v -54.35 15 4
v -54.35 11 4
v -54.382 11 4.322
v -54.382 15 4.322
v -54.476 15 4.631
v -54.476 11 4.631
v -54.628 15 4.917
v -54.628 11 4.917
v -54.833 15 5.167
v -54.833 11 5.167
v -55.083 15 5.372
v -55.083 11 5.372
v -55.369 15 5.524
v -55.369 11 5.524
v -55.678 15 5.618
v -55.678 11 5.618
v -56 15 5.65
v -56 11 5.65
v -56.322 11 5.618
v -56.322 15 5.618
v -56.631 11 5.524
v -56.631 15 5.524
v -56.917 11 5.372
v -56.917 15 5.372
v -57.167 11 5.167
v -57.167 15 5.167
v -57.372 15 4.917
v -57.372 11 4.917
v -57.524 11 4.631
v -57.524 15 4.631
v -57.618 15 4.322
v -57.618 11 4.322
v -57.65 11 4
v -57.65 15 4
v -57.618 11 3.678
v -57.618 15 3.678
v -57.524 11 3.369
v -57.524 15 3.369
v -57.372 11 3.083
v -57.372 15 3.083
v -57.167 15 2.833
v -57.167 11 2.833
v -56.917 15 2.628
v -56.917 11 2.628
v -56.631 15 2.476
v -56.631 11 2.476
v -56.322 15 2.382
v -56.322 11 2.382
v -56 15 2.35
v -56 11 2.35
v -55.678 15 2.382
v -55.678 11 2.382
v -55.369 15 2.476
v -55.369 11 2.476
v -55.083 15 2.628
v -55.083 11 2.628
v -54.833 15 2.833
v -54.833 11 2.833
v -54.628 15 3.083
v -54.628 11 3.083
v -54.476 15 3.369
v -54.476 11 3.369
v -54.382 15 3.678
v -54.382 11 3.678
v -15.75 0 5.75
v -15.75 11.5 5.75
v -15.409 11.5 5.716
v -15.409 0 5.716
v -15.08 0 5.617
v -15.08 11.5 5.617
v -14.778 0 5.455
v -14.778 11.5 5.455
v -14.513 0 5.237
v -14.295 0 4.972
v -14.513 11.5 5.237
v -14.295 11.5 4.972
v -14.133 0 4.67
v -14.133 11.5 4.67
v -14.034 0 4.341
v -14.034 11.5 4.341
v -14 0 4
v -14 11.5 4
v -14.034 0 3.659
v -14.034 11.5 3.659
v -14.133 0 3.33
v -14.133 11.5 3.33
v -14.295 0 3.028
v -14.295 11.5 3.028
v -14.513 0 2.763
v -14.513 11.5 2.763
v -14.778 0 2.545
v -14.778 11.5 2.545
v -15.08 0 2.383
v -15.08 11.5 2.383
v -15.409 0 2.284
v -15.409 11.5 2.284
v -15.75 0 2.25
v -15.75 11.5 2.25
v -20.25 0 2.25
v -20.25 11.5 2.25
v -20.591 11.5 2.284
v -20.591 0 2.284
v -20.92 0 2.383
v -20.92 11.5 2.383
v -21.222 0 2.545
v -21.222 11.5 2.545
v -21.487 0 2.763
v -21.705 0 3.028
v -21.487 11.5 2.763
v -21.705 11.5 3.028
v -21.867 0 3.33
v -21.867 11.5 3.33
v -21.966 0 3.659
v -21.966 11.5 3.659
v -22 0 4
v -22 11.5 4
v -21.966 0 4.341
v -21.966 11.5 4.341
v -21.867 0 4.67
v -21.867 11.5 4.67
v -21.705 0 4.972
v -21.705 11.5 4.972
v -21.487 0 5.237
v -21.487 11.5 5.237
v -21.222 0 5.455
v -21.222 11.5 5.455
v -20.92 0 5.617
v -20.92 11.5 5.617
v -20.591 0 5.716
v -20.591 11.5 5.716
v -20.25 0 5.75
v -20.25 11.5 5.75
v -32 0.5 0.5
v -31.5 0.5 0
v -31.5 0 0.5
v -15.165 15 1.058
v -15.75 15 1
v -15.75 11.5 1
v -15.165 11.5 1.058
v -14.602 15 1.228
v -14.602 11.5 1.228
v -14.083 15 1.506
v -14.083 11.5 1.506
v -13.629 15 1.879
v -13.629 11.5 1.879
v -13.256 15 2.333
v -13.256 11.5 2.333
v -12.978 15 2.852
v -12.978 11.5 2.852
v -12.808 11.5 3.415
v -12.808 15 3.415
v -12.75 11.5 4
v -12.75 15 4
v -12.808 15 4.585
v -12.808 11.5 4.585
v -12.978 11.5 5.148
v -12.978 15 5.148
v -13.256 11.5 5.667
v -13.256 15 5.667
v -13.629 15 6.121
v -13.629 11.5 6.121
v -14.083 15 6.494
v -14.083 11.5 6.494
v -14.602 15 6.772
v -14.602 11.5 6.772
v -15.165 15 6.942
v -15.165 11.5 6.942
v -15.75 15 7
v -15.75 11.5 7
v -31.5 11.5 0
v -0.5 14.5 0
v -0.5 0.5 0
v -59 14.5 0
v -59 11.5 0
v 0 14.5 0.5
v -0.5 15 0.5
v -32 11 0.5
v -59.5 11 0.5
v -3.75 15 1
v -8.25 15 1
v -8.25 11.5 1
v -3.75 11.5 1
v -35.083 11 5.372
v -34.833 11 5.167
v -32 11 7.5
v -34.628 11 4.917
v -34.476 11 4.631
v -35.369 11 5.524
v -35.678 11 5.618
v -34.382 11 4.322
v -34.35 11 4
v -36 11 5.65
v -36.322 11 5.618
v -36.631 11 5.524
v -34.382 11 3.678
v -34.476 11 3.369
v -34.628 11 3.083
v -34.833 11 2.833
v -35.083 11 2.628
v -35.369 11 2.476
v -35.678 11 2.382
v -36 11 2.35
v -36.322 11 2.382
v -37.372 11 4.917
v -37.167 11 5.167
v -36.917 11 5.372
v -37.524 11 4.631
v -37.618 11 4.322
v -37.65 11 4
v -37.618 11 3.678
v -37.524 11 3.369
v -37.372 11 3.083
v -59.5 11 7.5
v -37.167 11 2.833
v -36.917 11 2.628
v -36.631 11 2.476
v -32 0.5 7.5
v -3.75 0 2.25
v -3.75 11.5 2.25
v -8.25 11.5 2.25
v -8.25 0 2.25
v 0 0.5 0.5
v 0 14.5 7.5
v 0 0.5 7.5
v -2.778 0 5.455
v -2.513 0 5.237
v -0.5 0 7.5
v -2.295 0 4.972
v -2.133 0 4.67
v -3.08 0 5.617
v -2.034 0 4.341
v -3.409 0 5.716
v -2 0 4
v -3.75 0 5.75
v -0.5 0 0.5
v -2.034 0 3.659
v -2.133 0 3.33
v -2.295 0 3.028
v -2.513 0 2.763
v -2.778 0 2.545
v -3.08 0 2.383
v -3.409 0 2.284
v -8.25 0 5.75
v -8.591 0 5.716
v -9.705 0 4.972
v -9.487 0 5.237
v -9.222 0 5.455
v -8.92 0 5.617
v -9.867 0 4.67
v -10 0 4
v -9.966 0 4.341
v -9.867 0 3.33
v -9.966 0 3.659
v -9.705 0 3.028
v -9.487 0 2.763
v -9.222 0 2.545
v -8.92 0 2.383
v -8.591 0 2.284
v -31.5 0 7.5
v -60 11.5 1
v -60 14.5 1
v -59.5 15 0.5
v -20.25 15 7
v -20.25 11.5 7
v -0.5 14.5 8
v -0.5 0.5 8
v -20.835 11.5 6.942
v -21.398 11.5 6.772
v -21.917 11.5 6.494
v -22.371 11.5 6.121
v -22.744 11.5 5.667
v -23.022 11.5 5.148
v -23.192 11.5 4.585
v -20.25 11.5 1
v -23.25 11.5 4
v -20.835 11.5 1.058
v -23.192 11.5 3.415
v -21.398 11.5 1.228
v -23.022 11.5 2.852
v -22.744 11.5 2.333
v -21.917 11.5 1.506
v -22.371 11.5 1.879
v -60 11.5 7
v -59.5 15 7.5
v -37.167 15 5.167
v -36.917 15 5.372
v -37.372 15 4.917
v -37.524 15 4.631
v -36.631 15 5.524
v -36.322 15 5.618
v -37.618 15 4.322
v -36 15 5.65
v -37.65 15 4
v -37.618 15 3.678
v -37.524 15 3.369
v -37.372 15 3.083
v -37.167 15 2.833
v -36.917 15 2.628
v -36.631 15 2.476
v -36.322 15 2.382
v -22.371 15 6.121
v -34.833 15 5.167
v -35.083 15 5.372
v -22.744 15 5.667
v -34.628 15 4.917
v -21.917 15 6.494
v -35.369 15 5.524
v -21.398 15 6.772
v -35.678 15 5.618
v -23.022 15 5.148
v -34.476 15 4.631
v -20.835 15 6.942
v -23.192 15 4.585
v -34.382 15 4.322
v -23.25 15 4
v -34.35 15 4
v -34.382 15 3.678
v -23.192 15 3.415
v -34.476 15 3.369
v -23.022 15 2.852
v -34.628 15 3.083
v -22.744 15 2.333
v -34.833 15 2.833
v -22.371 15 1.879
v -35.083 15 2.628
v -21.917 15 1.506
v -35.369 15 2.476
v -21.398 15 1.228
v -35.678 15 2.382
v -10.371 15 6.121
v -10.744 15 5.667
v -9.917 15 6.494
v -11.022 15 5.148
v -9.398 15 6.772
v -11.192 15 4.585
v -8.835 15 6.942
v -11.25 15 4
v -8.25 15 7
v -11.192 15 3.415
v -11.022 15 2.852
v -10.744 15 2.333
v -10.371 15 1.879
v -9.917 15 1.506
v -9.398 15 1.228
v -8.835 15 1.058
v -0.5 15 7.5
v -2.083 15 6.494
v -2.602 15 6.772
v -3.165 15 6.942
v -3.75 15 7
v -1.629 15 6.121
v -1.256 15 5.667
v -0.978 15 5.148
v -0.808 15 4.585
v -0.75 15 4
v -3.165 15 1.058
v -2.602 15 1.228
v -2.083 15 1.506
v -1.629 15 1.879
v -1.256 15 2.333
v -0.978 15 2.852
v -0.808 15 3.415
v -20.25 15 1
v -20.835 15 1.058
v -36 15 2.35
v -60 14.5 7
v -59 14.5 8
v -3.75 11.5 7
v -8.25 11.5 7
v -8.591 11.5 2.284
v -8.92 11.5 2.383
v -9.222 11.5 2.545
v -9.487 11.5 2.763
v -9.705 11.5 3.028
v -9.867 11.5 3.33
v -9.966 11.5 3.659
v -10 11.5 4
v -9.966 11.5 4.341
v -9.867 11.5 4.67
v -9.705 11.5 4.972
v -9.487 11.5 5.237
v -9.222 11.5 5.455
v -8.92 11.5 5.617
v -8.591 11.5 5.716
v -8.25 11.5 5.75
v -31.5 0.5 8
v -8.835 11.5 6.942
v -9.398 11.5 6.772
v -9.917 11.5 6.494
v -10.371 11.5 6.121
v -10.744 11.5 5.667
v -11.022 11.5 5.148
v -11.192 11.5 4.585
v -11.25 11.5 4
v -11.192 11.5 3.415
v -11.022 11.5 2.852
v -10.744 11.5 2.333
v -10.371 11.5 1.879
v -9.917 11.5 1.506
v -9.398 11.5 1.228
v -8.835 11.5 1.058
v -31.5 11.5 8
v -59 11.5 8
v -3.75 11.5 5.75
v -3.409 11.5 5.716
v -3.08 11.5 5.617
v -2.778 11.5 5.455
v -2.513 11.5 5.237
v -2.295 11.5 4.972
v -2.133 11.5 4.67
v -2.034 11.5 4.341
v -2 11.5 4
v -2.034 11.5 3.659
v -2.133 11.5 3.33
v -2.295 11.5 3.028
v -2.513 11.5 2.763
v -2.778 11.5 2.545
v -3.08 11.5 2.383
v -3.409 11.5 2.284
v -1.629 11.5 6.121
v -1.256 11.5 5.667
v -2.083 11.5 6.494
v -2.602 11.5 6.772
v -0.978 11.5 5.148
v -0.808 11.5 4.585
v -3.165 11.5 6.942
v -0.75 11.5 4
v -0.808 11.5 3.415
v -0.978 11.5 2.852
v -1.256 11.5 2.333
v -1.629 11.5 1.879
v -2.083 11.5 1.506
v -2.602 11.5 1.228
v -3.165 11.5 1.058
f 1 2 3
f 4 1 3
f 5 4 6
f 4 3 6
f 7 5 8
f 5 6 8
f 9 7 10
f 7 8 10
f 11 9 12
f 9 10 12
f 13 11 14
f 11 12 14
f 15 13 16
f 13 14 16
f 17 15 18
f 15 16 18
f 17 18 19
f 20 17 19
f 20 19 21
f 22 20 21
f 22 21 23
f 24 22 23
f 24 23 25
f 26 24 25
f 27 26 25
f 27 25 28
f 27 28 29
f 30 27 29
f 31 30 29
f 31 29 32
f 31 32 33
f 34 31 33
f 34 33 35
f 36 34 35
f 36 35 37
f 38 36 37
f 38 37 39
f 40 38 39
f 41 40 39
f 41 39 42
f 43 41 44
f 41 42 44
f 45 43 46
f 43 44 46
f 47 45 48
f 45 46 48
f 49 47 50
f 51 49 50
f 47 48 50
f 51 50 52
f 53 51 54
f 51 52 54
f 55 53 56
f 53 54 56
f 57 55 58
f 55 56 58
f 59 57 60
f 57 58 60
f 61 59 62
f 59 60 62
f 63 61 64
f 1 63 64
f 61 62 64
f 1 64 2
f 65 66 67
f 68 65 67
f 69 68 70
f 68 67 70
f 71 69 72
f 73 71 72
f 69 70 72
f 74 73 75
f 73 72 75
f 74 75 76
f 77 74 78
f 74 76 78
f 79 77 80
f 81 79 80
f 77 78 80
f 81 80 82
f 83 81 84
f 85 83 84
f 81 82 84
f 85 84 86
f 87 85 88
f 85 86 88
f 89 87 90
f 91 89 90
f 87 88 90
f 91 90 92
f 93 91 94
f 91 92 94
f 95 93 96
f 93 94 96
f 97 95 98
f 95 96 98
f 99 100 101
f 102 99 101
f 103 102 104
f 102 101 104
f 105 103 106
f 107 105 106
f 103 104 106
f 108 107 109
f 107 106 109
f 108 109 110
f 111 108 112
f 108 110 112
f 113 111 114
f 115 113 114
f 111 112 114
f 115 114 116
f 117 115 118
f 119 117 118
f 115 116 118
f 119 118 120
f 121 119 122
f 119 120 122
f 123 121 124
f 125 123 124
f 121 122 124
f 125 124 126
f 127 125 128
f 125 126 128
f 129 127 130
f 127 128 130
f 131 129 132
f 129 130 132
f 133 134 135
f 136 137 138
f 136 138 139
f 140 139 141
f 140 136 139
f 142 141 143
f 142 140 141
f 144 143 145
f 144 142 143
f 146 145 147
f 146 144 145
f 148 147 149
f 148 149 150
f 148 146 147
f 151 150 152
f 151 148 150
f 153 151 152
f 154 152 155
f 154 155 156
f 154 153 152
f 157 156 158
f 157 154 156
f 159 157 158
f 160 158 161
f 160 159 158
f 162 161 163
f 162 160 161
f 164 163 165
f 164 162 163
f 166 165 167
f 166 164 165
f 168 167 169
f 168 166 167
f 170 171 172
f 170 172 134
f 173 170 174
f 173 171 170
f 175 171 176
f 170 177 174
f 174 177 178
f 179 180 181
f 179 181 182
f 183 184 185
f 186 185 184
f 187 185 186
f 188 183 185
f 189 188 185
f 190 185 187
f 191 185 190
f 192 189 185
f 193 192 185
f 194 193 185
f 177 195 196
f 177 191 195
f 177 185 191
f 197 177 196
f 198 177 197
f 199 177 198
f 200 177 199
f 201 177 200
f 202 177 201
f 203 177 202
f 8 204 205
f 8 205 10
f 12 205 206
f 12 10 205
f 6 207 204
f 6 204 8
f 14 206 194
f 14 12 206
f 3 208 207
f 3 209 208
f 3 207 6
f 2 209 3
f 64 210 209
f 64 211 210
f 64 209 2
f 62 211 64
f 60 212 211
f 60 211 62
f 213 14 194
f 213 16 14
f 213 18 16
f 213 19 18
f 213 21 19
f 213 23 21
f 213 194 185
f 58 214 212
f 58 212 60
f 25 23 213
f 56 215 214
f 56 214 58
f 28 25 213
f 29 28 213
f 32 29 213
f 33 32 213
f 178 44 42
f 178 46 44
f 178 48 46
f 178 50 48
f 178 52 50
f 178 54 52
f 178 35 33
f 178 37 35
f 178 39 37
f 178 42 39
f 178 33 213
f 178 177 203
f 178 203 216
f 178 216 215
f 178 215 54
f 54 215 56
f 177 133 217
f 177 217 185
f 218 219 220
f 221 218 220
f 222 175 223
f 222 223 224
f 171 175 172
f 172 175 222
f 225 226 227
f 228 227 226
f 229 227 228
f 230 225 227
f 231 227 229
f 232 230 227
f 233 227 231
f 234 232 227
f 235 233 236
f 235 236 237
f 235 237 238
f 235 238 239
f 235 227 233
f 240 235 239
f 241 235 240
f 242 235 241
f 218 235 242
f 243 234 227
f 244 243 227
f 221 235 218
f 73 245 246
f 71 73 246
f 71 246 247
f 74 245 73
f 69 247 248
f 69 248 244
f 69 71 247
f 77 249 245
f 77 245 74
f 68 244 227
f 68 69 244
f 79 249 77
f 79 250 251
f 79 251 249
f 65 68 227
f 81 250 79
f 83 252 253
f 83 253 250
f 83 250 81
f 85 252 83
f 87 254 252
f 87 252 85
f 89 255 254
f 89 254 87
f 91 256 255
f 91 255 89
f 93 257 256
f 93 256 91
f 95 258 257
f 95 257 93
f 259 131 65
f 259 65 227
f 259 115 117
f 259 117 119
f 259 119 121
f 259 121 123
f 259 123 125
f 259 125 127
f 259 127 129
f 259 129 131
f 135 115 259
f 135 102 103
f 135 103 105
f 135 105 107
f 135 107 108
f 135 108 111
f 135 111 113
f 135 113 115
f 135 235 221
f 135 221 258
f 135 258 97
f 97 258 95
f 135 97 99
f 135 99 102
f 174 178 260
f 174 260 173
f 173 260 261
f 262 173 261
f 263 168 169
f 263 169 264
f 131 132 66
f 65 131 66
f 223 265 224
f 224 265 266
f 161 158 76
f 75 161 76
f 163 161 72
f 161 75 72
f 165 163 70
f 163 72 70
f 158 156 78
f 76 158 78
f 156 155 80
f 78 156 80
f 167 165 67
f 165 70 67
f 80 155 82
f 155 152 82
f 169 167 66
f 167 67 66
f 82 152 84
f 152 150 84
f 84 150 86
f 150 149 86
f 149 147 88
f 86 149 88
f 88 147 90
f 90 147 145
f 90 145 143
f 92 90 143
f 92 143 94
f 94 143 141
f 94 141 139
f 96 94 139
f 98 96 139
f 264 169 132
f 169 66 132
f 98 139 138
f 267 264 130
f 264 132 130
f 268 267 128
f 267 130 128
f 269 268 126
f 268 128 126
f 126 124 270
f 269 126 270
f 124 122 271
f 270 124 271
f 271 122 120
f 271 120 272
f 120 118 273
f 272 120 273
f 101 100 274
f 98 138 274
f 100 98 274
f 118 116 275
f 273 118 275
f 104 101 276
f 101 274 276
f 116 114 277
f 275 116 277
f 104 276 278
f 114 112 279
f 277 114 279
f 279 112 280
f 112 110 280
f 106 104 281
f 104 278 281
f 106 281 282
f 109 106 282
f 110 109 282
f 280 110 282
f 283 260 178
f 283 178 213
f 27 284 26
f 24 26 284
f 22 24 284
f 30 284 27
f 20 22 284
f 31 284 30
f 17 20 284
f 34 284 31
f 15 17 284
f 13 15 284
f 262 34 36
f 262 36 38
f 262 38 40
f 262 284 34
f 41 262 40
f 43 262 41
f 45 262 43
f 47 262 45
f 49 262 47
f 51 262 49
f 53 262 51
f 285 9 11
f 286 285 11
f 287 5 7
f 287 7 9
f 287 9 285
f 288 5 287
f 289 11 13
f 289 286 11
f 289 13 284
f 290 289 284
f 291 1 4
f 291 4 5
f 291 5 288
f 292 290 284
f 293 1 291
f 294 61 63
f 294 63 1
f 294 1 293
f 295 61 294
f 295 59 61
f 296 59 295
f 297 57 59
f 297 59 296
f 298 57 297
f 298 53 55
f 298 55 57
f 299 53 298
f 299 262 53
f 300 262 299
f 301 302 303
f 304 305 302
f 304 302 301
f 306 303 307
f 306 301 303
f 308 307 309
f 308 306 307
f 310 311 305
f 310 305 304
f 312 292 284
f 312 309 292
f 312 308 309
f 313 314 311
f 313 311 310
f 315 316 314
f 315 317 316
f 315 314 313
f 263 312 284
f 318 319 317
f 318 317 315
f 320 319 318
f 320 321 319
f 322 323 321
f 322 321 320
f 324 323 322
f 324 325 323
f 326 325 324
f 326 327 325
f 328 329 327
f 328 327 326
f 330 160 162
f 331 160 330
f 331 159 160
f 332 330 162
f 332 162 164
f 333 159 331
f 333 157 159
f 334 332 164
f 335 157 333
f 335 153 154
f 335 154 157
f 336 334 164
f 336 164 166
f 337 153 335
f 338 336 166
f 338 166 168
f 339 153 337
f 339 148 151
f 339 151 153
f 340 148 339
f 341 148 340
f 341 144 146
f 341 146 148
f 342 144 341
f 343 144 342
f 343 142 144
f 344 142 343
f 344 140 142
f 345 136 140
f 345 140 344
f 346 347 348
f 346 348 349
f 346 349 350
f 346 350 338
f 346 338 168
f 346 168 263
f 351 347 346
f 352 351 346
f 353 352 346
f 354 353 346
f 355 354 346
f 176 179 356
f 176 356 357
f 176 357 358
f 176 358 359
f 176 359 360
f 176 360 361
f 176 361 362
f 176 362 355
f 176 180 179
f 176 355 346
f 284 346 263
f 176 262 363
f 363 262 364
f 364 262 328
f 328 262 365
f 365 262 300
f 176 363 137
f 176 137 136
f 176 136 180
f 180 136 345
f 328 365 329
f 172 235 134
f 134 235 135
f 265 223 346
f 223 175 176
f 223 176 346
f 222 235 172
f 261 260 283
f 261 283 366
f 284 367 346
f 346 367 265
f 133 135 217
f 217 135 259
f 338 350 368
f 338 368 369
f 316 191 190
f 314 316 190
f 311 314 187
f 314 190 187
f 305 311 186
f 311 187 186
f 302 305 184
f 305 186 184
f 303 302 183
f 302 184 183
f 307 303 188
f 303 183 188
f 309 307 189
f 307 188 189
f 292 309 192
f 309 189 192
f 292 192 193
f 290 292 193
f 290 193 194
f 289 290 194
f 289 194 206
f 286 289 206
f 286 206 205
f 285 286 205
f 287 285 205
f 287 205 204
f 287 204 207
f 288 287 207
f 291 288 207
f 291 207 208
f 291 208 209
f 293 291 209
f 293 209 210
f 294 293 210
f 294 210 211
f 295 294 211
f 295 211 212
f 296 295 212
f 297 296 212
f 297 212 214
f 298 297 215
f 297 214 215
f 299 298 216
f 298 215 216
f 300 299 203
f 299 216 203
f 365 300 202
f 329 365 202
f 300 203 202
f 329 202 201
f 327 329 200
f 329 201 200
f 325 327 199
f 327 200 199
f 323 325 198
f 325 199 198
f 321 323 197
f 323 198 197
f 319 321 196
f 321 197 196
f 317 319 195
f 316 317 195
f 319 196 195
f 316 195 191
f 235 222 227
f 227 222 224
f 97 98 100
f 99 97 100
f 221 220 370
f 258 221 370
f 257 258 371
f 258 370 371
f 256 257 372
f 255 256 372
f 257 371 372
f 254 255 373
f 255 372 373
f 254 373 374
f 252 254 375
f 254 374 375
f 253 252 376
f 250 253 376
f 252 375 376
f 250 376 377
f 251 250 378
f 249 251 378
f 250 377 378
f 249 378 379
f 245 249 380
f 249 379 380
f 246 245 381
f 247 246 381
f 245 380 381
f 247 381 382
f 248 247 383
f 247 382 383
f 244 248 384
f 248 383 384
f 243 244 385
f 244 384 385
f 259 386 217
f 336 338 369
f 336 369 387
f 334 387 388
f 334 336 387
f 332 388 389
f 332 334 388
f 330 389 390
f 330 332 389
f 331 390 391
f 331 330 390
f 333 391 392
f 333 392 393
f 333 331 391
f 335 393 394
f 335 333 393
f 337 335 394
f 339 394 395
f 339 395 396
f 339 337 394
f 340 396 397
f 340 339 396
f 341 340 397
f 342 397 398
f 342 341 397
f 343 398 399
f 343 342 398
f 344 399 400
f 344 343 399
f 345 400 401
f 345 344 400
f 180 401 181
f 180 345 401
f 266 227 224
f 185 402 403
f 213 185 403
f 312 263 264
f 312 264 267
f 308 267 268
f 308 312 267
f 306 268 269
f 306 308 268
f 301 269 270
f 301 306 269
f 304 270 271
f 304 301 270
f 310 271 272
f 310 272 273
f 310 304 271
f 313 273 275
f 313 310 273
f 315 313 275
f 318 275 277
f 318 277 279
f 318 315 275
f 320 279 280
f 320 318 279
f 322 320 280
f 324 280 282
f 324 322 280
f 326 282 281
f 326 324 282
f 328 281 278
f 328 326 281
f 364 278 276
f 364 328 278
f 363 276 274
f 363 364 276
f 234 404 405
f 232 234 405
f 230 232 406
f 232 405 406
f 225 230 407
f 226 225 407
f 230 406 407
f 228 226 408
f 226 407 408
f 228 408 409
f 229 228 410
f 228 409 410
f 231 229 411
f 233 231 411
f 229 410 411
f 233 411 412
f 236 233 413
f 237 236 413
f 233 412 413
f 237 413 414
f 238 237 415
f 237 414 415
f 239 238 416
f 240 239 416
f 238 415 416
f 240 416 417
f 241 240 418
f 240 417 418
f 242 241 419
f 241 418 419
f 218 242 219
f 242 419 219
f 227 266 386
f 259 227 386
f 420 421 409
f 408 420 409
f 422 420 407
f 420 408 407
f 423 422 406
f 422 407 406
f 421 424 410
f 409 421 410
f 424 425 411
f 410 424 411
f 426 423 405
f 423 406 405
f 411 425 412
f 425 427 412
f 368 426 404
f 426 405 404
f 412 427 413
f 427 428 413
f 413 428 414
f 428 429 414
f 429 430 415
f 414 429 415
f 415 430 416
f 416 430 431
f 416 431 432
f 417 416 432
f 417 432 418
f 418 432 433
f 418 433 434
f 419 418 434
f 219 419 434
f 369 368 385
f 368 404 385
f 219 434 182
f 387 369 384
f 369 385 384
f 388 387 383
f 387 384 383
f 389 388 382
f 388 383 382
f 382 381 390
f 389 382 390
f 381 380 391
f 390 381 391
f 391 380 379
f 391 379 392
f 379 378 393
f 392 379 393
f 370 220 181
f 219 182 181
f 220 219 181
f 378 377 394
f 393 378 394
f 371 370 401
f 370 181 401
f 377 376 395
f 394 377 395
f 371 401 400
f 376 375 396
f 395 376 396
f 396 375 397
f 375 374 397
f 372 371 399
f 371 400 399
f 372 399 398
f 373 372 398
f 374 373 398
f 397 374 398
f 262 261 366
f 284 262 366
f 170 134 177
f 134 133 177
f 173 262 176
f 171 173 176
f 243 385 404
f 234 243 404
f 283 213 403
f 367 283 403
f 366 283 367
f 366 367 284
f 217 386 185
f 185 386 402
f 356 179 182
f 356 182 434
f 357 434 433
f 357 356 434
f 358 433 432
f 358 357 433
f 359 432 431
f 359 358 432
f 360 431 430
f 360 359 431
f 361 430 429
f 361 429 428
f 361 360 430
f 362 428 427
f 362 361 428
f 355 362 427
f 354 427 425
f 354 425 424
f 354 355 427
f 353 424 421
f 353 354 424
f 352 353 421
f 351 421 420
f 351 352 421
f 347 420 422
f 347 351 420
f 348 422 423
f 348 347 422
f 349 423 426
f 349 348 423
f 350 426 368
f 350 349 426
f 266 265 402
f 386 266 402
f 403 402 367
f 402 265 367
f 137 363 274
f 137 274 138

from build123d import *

# Parameters (mm, degrees)
EXTRUDE_1_DEPTH        = 8
HOLE_WIZARD_M4_1_D     = 3.3
CUT_EXTRUDE_1_DEPTH    = 3.5
CUT_EXTRUDE_2_DEPTH    = 62.613716005
PATTERN_LINEAR_1_COUNT = 2
PATTERN_LINEAR_1_PITCH = 12
CHAMFER_1_SIZE         = 1
CHAMFER_2_SIZE         = 0.5
PATTERN_LINEAR_2_COUNT = 2
PATTERN_LINEAR_2_PITCH = 20


with BuildPart() as part:
    # 草图1 → 凸台-拉伸1 (new body)
    with BuildSketch(Plane.XY):
        Polygon((0, 0), (-32, 0), (-32, 11), (-60, 11), (-60, 15), (0, 15), align=None)
    extrude(amount=EXTRUDE_1_DEPTH)

    # M4 螺纹孔1 (through all)
    with Locations(Plane(origin=(0, 15, 0), x_dir=(-1, 0, 0), z_dir=(0, 1, 0))):
        with Locations((56, 4)):
            hole_wizard_m4_1 = Hole(HOLE_WIZARD_M4_1_D / 2)

    # 草图4 → 切除-拉伸1 (cut)
    with BuildSketch(Plane(origin=(0, 15, 0), x_dir=(1, 0, 0), z_dir=(0, 1, 0))):
        with BuildLine():
            Line((-15.75, -7), (-20.25, -7))
            ThreePointArc((-20.25, -7), (-23.25, -4), (-20.25, -1))
            Line((-20.25, -1), (-15.75, -1))
            ThreePointArc((-15.75, -1), (-12.75, -4), (-15.75, -7))
        make_face()
    cut_extrude_1 = extrude(amount=-CUT_EXTRUDE_1_DEPTH, mode=Mode.SUBTRACT)

    # 草图5 → 切除-拉伸2 (cut, through all)
    with BuildSketch(Plane(origin=(0, 11.5, 0), x_dir=(1, 0, 0), z_dir=(0, 1, 0))):
        with BuildLine():
            Line((-20.25, -5.75), (-15.75, -5.75))
            ThreePointArc((-15.75, -5.75), (-14, -4), (-15.75, -2.25))
            Line((-15.75, -2.25), (-20.25, -2.25))
            ThreePointArc((-20.25, -2.25), (-22, -4), (-20.25, -5.75))
        make_face()
    cut_extrude_2 = extrude(amount=-CUT_EXTRUDE_2_DEPTH, mode=Mode.SUBTRACT)

    # 阵列(线性)1: 切除-拉伸1, 切除-拉伸2 ×2
    with Locations(*[(i * PATTERN_LINEAR_1_PITCH, 0, 0) for i in range(1, PATTERN_LINEAR_1_COUNT)]):
        add(cut_extrude_1, mode=Mode.SUBTRACT)
        add(cut_extrude_2, mode=Mode.SUBTRACT)

    # 倒角1
    chamfer_1_edges = [part.edges().sort_by_distance(p)[0] for p in [
        (-60, 13, 8),
        (-60, 13, 0),
    ]]
    chamfer(chamfer_1_edges, length=CHAMFER_1_SIZE)

    # 倒角2
    chamfer_2_edges = [part.edges().sort_by_distance(p)[0] for p in [
        (0, 0, 4),
        (-32, 5.5, 8),
        (-16, 0, 8),
        (0, 7.5, 8),
        (-32, 5.5, 0),
        (-16, 0, 0),
        (0, 7.5, 0),
        (-29.5, 15, 0),
        (0, 15, 4),
        (-29.5, 15, 8),
        (-60, 11, 4),
        (-60, 15, 4),
        (-45.5, 11, 8),
        (-32, 0, 4),
        (-45.5, 11, 0),
    ]]
    chamfer(chamfer_2_edges, length=CHAMFER_2_SIZE - 0.0001)  # a hair under: the kernel refuses the full size

    # 阵列(线性)2: M4 螺纹孔1 ×2
    with Locations(*[(i * PATTERN_LINEAR_2_PITCH, 0, 0) for i in range(1, PATTERN_LINEAR_2_COUNT)]):
        add(hole_wizard_m4_1, mode=Mode.SUBTRACT)


solid = part.part
